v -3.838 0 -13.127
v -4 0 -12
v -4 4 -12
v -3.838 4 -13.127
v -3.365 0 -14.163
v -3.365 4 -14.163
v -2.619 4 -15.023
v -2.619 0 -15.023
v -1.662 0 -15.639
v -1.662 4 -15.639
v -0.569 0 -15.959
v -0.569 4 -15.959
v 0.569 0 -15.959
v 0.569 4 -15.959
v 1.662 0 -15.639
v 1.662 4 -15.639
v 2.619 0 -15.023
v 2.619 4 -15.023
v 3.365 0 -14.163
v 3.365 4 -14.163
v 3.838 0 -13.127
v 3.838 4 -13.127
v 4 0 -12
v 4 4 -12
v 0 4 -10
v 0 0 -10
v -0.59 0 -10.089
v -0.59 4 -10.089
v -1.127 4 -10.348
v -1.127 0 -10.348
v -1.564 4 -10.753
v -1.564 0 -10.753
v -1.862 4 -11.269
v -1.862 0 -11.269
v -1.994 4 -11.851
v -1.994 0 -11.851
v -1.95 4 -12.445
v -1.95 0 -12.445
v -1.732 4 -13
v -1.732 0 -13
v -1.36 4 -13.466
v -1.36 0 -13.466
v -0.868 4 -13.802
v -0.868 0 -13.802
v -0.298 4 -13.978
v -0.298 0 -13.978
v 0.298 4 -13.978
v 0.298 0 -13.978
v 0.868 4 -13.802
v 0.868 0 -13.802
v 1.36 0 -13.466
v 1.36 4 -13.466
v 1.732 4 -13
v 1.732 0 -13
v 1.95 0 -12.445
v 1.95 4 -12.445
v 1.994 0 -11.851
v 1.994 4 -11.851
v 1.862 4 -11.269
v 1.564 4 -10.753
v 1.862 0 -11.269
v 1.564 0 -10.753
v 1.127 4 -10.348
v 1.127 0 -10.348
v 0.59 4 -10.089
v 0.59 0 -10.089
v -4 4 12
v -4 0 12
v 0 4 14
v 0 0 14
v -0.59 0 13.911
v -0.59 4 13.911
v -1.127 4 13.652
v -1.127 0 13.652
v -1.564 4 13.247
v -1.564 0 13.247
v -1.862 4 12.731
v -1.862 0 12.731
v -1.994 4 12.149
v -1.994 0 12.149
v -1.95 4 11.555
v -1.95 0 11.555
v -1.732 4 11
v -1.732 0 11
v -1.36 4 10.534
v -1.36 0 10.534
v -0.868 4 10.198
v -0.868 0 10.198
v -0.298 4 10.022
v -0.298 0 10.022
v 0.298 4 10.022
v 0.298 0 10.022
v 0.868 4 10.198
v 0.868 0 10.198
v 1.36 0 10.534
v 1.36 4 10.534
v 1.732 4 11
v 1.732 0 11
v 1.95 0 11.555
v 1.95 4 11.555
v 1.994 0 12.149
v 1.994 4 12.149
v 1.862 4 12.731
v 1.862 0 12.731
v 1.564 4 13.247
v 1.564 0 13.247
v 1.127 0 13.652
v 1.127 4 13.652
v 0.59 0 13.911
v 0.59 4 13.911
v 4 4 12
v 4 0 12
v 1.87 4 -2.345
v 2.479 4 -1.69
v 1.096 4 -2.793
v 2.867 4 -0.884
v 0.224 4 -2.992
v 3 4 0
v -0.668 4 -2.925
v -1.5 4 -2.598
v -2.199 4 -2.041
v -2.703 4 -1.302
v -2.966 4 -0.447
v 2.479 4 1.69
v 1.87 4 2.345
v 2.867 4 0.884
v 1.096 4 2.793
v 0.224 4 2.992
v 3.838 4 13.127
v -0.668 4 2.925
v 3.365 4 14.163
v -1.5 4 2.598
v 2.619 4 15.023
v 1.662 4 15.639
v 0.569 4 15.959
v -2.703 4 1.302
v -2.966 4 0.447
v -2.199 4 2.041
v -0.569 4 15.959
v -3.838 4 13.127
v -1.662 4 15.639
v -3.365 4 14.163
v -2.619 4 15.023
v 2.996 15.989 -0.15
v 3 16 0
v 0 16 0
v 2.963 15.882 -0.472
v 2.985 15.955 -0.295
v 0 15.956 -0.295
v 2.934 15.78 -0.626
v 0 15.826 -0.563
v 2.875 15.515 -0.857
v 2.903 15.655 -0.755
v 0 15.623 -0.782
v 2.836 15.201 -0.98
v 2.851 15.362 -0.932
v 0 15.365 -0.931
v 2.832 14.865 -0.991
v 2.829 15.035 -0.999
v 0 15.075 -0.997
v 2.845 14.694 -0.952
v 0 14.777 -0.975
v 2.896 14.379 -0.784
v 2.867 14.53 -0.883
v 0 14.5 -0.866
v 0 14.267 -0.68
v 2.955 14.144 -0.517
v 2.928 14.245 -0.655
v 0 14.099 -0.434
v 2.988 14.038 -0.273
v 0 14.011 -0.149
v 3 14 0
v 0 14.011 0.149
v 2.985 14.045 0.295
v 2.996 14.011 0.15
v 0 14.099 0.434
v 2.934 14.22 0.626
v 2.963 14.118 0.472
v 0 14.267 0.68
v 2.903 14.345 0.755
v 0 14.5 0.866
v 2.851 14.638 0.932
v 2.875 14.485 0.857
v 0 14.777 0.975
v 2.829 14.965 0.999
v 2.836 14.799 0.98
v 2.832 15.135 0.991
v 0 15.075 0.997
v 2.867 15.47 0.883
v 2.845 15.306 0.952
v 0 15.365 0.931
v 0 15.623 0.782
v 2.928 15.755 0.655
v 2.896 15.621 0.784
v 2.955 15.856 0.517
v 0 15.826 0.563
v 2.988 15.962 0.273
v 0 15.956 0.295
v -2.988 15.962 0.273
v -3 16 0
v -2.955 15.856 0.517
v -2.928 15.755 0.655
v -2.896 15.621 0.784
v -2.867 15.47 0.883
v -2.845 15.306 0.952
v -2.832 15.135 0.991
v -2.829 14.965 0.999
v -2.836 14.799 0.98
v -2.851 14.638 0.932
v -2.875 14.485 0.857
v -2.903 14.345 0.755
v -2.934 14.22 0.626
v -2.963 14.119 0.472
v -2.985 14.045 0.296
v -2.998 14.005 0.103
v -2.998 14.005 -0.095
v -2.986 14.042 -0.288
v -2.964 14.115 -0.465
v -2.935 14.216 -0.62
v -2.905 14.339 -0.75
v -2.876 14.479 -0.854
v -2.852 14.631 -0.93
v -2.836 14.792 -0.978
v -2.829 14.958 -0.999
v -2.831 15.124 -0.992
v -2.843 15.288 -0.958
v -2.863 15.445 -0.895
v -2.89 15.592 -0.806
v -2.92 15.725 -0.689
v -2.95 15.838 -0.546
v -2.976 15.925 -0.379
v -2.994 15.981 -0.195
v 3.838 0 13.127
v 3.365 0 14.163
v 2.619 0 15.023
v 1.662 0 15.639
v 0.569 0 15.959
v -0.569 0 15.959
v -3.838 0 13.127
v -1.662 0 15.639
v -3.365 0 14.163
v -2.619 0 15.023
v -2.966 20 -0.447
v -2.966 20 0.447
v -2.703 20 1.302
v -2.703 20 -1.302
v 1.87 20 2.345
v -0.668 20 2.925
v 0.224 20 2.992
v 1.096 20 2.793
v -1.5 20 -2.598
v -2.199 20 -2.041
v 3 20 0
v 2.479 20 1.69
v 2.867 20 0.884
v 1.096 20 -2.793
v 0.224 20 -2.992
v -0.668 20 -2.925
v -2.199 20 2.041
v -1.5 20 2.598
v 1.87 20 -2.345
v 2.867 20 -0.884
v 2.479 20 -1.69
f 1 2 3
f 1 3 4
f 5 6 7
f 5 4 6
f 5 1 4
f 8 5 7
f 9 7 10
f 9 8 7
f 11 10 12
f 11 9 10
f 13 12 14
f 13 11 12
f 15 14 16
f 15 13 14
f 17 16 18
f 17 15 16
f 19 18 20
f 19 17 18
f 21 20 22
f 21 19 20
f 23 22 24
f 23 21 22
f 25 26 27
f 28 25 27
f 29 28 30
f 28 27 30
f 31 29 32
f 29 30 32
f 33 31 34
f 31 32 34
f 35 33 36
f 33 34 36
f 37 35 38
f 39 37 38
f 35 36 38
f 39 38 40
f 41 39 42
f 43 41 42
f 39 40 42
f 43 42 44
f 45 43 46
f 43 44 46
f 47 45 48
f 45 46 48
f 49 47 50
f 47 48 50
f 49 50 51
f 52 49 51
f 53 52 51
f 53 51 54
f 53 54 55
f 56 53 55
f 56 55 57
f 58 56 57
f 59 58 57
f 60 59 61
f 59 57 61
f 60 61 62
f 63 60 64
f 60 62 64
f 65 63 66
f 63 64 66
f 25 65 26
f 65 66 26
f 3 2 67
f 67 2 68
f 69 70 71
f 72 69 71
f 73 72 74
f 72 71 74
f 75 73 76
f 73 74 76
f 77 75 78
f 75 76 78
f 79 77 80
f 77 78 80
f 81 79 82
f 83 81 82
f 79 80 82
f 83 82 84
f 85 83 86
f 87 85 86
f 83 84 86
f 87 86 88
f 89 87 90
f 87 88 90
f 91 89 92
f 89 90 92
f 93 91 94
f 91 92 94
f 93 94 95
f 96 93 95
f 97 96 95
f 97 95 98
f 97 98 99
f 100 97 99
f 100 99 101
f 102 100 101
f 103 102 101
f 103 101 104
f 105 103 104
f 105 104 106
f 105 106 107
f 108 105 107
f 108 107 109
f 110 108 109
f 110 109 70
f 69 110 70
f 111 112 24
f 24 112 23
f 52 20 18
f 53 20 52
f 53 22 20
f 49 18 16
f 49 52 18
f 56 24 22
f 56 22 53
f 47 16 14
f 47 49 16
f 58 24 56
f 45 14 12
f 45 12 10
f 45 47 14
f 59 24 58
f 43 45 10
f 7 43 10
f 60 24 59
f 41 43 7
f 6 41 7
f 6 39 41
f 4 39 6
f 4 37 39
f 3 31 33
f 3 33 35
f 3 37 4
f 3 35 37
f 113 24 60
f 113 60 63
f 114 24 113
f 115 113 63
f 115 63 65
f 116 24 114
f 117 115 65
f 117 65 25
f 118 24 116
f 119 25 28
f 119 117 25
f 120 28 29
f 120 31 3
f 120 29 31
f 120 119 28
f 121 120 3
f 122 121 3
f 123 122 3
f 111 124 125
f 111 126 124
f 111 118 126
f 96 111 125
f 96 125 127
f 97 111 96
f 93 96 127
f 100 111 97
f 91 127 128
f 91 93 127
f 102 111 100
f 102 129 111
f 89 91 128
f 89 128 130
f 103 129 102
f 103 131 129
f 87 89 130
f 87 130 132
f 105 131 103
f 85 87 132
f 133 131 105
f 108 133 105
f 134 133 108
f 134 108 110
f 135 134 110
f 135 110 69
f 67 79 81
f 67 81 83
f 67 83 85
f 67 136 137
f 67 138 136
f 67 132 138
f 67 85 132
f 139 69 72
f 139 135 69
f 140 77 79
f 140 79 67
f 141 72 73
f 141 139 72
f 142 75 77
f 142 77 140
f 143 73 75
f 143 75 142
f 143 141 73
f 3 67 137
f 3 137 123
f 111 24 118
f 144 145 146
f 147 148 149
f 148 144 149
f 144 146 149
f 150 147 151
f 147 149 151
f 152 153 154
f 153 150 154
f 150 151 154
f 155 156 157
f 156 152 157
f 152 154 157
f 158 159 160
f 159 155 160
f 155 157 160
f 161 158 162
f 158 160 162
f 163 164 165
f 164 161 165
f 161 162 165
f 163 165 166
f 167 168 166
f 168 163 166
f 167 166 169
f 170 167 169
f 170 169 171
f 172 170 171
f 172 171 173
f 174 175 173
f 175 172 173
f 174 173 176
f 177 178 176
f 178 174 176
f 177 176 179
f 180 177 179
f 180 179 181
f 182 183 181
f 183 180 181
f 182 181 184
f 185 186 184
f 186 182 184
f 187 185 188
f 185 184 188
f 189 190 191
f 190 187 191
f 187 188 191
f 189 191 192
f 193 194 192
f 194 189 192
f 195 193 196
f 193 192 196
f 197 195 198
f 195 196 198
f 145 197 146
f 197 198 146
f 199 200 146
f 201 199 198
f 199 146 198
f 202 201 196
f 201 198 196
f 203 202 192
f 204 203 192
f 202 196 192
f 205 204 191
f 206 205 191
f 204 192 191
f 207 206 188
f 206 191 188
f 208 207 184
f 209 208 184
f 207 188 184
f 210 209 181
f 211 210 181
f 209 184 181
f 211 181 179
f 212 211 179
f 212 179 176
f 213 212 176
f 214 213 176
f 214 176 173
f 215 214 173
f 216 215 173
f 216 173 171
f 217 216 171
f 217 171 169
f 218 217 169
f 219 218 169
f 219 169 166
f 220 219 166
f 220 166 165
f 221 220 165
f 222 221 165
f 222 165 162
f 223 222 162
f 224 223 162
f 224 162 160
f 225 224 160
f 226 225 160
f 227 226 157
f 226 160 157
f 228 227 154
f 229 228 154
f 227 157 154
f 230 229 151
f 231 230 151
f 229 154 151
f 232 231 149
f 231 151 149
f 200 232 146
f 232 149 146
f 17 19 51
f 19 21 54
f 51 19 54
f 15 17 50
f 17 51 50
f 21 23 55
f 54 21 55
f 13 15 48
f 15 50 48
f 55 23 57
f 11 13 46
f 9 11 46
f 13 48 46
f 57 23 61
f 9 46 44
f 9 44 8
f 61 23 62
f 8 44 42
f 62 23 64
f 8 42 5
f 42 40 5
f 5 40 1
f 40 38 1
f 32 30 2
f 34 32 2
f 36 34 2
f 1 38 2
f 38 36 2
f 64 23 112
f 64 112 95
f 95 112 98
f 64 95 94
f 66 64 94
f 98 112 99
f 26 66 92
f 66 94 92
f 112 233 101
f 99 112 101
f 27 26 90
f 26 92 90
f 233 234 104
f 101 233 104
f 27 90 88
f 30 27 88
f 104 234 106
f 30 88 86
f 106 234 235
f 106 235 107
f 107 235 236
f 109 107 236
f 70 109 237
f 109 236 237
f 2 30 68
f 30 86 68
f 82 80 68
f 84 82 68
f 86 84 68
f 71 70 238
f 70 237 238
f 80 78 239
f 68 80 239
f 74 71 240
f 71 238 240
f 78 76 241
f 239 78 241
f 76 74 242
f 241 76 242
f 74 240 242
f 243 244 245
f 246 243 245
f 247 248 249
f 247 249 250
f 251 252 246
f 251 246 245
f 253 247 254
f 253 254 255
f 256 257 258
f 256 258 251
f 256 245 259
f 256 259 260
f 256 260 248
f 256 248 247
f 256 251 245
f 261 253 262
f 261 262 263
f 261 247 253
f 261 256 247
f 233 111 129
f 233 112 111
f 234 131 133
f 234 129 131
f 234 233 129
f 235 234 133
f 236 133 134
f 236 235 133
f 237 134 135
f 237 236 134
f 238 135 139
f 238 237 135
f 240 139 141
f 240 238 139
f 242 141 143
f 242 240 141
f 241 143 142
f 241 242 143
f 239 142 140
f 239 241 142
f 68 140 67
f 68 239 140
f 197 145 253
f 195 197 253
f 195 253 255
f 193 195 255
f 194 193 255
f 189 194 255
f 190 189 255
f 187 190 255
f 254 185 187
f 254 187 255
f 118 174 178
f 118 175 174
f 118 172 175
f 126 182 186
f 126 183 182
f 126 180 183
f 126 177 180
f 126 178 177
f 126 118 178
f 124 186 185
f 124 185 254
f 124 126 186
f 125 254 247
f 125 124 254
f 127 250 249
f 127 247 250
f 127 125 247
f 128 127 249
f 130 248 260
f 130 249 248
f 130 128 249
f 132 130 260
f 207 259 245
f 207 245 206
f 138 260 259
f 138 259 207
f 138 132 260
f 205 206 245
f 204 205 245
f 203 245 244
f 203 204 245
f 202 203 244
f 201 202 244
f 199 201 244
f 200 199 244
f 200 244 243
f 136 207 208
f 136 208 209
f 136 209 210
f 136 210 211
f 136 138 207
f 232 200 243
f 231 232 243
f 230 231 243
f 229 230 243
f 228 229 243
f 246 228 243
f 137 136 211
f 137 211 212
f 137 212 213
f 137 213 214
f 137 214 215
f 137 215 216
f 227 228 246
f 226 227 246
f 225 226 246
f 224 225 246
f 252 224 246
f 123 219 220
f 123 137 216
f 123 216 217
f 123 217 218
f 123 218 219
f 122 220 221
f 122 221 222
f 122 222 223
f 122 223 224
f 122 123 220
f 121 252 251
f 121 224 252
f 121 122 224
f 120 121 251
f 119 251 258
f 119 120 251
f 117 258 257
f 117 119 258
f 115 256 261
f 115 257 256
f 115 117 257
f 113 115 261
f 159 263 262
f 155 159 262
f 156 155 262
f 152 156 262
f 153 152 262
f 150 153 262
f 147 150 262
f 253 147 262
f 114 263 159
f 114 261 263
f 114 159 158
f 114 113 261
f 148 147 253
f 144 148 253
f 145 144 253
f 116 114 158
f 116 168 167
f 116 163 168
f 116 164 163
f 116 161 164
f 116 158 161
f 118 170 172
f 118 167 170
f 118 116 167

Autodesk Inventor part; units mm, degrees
ref_plane "YZ Plane" through (0, 0, 0) normal (1, 0, 0) x (0, 1, 0)
ref_plane "XZ Plane" through (0, 0, 0) normal (0, 1, 0) x (-1, 0, 0)
ref_plane "XY Plane" through (0, 0, 0) normal (0, 0, 1) x (1, 0, 0)
sketch "Sketch1" plane through (0, 0, 0) normal (0, 1, 0) x (-1, 0, 0)
  line L0 (0, 12) -> (0, -12) construction
  line L1 (-4, 12) -> (-4, -12)
  line L2 (4, -12) -> (4, 12)
  arc A0 (4, 12) -> (-4, 12) centre (0, 12) ccw
  arc A1 (-4, -12) -> (4, -12) centre (0, -12) ccw
  point P0 (0, 0)
  point P1 (0, 0)
  dimension "d0" = 24
  dimension "d1" = 8
extrude "Extrusion1" add sketch "Sketch1" along normal blind 4
sketch "Sketch2" plane through (0, 4, 0) normal (0, 1, 0) x (1, 0, 0)
  circle A0 centre (0, 0) radius 3
  dimension "d4" = 6
extrude "Extrusion2" add sketch "Sketch2" along normal blind 16
sketch "Sketch3" plane through (0, 0, 0) normal (1, 0, 0) x (0, 1, 0)
  circle A0 centre (15, 0) radius 1
  line L0 (20, -3) -> (20, 3) projected
  point P0 (0, 0)
  dimension "d7" = 2
  dimension "d8" = 5
extrude "Extrusion3" cut sketch "Sketch3" along normal mid plane 16
sketch "Sketch4" plane through (0, 4, 0) normal (0, 1, 0) x (1, 0, 0)
  arc A0 (4, 12) -> (-4, 12) centre (0, 12) ccw projected
  arc A1 (-4, -12) -> (4, -12) centre (0, -12) ccw projected
hole "Hole1" at (0, 4, 12) at (0, 4, -12) direction (0, -1, 0) diameter 4 end through all
properties part number "Crank"
